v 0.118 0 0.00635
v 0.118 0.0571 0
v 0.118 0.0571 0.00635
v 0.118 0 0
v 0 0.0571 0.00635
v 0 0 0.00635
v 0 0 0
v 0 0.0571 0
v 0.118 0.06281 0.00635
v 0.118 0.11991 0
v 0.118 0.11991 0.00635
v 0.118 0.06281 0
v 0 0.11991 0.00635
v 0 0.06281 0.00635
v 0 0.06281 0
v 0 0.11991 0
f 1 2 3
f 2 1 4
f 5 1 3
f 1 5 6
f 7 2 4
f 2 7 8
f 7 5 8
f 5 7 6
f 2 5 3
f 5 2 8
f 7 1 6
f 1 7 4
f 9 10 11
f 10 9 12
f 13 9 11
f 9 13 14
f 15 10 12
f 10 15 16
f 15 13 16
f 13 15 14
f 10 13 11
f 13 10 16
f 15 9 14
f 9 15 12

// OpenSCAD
union(){
    translate(v=[0.005, 0.014, 0.003]){
        rotate(a=[0, 90, 0]){
            color("orange"){
                cylinder(h=0.11, r=0.003, $fn=100);
            };
        };
    };
    translate(v=[0.005, 0.028, 0.003]){
        rotate(a=[0, 90, 0]){
            color("orange"){
                cylinder(h=0.11, r=0.003, $fn=100);
            };
        };
    };
    translate(v=[0.005, 0.042, 0.003]){
        rotate(a=[0, 90, 0]){
            color("orange"){
                cylinder(h=0.11, r=0.003, $fn=100);
            };
        };
    };
    translate(v=[0, 0, 0]){
        color("yellow",0.5){
            cube(size=[0.118, 0.0571, 0.00635]);
        };
    };
    translate(v=[0.001, 0.06381, 0.003]){
        color("orange"){
            cube(size=[0.11599999999999999, 0.055099999999999996, 0.0012699999999999999]);
        };
    };
    translate(v=[0, 0.06281, 0]){
        color("yellow",0.6){
            cube(size=[0.118, 0.0571, 0.00635]);
        };
    };
};
